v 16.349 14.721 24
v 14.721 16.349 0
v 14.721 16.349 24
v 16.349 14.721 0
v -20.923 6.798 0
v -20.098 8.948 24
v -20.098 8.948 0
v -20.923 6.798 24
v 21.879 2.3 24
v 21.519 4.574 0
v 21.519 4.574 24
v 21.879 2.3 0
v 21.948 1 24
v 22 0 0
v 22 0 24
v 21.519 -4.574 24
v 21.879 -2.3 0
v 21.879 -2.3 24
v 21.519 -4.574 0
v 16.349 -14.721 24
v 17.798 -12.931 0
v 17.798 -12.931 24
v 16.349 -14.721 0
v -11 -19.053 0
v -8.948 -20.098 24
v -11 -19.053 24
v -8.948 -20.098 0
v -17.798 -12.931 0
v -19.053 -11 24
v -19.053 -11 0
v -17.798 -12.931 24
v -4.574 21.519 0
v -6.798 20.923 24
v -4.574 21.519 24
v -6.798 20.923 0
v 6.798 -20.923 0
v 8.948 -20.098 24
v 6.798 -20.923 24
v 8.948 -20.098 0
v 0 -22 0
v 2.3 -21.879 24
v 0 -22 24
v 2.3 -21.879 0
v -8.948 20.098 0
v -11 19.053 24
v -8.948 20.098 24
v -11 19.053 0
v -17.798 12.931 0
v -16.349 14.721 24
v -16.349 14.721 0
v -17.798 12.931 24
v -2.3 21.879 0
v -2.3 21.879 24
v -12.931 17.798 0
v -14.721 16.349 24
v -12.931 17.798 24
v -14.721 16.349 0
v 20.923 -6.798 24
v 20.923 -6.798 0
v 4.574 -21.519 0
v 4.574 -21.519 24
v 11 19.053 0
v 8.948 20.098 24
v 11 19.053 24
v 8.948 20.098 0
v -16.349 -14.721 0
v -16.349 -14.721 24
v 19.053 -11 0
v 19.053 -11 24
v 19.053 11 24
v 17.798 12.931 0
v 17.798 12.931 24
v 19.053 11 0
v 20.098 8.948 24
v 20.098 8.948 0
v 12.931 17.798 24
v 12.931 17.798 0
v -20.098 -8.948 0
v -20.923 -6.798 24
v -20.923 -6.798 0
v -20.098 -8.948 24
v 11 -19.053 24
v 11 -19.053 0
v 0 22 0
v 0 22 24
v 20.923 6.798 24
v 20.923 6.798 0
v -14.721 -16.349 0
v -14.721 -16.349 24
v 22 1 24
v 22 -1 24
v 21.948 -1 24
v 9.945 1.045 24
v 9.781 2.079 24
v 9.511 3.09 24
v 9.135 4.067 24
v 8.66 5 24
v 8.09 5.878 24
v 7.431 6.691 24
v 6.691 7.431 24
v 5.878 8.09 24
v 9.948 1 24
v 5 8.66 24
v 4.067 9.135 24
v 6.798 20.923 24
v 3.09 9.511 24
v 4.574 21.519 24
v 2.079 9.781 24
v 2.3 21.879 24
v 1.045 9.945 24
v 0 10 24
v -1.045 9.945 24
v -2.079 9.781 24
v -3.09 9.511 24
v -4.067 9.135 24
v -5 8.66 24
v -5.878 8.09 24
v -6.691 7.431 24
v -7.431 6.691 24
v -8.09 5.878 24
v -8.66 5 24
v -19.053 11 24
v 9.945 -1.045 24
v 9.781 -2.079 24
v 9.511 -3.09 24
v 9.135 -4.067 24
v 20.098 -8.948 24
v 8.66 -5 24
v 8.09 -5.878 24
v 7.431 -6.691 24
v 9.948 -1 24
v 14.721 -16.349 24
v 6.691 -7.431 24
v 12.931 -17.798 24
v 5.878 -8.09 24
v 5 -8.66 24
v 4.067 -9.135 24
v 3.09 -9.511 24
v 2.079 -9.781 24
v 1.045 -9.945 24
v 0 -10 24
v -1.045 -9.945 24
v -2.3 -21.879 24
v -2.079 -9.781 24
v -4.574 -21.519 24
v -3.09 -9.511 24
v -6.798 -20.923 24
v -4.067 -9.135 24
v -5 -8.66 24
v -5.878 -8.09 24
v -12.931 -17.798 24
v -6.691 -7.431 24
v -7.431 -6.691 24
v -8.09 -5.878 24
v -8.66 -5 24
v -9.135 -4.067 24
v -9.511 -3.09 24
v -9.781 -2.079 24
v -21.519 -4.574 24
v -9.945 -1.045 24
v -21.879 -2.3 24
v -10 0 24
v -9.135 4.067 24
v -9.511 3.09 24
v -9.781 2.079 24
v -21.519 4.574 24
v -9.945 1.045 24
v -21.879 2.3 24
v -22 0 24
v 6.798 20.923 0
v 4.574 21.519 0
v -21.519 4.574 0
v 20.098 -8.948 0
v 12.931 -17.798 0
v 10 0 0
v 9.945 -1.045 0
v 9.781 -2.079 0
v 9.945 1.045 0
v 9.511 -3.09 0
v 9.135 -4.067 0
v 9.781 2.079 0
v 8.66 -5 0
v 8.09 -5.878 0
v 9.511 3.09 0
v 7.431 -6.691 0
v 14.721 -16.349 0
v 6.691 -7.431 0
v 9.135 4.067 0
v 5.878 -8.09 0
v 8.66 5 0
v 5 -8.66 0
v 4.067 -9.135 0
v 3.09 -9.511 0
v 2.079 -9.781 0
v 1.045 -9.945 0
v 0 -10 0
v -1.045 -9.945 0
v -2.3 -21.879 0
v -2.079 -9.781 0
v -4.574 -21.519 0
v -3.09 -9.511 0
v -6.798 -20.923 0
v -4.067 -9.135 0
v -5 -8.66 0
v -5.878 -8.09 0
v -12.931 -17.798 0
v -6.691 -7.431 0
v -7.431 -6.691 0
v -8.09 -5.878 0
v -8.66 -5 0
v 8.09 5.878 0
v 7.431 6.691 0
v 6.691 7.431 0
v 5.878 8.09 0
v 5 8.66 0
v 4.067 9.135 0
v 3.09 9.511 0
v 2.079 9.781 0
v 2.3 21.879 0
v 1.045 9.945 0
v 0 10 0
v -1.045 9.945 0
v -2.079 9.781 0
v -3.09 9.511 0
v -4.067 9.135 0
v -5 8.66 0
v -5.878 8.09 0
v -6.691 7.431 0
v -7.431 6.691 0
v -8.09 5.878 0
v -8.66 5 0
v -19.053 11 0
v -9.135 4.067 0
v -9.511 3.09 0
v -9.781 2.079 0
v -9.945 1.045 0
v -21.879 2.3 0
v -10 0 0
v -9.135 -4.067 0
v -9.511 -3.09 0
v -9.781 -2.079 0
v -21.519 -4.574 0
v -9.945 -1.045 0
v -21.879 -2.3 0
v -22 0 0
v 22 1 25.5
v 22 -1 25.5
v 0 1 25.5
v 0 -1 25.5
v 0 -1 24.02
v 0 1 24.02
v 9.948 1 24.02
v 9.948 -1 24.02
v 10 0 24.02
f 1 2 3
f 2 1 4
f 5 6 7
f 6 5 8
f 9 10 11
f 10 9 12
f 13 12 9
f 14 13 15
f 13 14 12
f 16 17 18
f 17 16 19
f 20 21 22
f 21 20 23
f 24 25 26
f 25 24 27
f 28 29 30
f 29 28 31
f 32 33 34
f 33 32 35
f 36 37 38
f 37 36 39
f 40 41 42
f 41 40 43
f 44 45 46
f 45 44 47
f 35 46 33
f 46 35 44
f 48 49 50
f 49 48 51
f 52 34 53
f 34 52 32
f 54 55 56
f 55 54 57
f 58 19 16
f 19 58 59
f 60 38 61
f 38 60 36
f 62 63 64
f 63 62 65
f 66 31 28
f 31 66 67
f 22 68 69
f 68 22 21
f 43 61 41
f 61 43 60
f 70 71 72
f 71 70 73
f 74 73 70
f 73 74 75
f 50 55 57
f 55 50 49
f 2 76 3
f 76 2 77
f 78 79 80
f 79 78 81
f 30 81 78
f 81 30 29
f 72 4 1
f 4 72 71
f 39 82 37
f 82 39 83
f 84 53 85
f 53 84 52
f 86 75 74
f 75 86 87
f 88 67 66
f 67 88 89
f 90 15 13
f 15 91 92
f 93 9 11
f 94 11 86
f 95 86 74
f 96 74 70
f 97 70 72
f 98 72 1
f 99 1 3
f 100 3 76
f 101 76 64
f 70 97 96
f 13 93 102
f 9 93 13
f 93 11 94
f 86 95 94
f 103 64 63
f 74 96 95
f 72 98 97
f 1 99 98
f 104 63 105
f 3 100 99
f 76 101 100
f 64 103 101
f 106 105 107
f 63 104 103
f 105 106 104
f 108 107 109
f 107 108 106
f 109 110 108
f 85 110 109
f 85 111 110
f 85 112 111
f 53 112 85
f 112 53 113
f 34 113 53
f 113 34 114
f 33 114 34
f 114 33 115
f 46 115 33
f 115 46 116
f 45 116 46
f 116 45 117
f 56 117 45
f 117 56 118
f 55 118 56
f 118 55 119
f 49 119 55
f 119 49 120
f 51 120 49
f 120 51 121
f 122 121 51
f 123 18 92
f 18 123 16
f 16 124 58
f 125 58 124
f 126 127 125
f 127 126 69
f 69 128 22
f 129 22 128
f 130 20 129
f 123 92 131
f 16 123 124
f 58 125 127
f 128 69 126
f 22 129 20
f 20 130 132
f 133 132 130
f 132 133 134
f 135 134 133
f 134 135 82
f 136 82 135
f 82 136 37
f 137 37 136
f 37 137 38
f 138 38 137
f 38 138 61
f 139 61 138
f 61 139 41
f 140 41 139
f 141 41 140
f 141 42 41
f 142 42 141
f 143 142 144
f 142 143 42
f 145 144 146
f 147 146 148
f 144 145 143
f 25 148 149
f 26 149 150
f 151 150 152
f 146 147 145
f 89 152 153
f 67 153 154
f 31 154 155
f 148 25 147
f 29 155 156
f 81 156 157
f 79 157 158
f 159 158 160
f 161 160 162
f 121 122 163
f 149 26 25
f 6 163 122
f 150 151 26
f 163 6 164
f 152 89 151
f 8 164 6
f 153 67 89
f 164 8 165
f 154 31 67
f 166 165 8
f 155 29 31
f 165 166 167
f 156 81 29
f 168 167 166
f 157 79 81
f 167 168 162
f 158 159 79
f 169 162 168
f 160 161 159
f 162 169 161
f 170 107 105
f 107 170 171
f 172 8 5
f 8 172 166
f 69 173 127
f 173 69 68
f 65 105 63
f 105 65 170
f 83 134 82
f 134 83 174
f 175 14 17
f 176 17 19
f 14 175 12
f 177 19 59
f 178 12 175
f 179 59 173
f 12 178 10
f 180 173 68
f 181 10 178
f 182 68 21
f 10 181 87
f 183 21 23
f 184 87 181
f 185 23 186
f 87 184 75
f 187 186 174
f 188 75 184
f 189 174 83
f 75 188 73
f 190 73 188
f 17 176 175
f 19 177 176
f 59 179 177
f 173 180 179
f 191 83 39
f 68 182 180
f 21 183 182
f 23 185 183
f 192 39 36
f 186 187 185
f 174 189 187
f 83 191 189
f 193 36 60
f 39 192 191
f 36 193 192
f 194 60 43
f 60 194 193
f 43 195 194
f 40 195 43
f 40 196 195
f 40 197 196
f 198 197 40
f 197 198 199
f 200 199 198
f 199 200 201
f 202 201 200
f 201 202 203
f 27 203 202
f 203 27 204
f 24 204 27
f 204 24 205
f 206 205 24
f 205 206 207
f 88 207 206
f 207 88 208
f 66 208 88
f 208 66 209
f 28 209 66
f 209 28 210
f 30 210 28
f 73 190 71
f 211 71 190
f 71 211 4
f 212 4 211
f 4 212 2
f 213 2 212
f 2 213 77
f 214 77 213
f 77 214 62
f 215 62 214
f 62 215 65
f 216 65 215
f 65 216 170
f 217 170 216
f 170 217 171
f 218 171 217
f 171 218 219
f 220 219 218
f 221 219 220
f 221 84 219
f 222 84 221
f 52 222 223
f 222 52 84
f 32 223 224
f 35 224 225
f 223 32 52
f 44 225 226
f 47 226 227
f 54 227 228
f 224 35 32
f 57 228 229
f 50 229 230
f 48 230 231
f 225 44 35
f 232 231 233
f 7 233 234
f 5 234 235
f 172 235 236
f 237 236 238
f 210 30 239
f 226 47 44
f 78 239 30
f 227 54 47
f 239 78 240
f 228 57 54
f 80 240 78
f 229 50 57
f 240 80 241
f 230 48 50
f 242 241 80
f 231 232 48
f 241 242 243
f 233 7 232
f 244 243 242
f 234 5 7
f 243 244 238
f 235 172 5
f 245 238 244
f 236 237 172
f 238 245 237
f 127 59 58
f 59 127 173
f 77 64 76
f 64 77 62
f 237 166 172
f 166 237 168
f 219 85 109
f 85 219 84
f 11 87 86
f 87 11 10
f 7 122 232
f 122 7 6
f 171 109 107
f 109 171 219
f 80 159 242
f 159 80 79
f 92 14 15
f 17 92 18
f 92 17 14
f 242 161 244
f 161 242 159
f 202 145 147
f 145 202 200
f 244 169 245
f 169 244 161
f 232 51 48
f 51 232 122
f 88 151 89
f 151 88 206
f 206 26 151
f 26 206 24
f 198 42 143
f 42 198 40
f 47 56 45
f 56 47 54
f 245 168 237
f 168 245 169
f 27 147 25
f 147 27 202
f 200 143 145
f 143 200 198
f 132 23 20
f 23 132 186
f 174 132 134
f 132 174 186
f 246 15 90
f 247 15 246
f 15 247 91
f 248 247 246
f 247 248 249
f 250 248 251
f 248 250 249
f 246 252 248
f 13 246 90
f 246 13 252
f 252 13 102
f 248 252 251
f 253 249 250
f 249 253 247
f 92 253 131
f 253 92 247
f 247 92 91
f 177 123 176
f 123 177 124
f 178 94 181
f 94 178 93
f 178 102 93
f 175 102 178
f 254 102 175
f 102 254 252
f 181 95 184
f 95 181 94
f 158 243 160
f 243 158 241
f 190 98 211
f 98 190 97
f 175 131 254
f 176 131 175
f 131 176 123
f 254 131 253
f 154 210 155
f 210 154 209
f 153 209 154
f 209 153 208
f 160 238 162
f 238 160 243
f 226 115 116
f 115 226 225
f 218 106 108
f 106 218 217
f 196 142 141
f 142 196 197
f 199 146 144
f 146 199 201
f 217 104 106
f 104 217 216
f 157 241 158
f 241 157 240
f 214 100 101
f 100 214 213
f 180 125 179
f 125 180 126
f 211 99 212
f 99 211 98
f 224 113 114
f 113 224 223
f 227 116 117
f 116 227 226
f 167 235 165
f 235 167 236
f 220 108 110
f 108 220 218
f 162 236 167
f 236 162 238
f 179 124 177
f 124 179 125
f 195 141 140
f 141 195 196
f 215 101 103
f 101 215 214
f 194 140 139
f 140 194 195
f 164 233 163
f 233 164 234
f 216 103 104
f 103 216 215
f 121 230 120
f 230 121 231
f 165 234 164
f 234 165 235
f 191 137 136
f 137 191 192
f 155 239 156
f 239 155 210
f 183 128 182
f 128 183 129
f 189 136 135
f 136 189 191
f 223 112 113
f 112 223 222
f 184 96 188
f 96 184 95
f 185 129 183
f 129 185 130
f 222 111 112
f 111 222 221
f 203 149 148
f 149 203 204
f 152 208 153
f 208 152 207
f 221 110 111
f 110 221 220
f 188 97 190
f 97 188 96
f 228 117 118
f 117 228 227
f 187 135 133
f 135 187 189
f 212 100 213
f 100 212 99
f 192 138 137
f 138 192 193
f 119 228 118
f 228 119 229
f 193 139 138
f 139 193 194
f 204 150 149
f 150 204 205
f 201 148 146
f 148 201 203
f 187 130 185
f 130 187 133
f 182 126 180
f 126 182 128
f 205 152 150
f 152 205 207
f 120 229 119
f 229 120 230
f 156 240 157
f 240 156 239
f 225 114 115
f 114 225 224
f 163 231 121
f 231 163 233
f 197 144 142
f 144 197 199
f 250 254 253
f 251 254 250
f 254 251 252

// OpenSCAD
// Pointer control knob.
$fn = 60;
eps = 0.02;
bore_d = 20;
knob_d = 44;
knob_h = 24;
difference() { union() { cylinder(d=knob_d,h=knob_h); translate([0,-1,knob_h]) cube([knob_d/2,2,1.5]); } translate([0,0,-eps]) cylinder(d=bore_d,h=knob_h+2*eps); }
